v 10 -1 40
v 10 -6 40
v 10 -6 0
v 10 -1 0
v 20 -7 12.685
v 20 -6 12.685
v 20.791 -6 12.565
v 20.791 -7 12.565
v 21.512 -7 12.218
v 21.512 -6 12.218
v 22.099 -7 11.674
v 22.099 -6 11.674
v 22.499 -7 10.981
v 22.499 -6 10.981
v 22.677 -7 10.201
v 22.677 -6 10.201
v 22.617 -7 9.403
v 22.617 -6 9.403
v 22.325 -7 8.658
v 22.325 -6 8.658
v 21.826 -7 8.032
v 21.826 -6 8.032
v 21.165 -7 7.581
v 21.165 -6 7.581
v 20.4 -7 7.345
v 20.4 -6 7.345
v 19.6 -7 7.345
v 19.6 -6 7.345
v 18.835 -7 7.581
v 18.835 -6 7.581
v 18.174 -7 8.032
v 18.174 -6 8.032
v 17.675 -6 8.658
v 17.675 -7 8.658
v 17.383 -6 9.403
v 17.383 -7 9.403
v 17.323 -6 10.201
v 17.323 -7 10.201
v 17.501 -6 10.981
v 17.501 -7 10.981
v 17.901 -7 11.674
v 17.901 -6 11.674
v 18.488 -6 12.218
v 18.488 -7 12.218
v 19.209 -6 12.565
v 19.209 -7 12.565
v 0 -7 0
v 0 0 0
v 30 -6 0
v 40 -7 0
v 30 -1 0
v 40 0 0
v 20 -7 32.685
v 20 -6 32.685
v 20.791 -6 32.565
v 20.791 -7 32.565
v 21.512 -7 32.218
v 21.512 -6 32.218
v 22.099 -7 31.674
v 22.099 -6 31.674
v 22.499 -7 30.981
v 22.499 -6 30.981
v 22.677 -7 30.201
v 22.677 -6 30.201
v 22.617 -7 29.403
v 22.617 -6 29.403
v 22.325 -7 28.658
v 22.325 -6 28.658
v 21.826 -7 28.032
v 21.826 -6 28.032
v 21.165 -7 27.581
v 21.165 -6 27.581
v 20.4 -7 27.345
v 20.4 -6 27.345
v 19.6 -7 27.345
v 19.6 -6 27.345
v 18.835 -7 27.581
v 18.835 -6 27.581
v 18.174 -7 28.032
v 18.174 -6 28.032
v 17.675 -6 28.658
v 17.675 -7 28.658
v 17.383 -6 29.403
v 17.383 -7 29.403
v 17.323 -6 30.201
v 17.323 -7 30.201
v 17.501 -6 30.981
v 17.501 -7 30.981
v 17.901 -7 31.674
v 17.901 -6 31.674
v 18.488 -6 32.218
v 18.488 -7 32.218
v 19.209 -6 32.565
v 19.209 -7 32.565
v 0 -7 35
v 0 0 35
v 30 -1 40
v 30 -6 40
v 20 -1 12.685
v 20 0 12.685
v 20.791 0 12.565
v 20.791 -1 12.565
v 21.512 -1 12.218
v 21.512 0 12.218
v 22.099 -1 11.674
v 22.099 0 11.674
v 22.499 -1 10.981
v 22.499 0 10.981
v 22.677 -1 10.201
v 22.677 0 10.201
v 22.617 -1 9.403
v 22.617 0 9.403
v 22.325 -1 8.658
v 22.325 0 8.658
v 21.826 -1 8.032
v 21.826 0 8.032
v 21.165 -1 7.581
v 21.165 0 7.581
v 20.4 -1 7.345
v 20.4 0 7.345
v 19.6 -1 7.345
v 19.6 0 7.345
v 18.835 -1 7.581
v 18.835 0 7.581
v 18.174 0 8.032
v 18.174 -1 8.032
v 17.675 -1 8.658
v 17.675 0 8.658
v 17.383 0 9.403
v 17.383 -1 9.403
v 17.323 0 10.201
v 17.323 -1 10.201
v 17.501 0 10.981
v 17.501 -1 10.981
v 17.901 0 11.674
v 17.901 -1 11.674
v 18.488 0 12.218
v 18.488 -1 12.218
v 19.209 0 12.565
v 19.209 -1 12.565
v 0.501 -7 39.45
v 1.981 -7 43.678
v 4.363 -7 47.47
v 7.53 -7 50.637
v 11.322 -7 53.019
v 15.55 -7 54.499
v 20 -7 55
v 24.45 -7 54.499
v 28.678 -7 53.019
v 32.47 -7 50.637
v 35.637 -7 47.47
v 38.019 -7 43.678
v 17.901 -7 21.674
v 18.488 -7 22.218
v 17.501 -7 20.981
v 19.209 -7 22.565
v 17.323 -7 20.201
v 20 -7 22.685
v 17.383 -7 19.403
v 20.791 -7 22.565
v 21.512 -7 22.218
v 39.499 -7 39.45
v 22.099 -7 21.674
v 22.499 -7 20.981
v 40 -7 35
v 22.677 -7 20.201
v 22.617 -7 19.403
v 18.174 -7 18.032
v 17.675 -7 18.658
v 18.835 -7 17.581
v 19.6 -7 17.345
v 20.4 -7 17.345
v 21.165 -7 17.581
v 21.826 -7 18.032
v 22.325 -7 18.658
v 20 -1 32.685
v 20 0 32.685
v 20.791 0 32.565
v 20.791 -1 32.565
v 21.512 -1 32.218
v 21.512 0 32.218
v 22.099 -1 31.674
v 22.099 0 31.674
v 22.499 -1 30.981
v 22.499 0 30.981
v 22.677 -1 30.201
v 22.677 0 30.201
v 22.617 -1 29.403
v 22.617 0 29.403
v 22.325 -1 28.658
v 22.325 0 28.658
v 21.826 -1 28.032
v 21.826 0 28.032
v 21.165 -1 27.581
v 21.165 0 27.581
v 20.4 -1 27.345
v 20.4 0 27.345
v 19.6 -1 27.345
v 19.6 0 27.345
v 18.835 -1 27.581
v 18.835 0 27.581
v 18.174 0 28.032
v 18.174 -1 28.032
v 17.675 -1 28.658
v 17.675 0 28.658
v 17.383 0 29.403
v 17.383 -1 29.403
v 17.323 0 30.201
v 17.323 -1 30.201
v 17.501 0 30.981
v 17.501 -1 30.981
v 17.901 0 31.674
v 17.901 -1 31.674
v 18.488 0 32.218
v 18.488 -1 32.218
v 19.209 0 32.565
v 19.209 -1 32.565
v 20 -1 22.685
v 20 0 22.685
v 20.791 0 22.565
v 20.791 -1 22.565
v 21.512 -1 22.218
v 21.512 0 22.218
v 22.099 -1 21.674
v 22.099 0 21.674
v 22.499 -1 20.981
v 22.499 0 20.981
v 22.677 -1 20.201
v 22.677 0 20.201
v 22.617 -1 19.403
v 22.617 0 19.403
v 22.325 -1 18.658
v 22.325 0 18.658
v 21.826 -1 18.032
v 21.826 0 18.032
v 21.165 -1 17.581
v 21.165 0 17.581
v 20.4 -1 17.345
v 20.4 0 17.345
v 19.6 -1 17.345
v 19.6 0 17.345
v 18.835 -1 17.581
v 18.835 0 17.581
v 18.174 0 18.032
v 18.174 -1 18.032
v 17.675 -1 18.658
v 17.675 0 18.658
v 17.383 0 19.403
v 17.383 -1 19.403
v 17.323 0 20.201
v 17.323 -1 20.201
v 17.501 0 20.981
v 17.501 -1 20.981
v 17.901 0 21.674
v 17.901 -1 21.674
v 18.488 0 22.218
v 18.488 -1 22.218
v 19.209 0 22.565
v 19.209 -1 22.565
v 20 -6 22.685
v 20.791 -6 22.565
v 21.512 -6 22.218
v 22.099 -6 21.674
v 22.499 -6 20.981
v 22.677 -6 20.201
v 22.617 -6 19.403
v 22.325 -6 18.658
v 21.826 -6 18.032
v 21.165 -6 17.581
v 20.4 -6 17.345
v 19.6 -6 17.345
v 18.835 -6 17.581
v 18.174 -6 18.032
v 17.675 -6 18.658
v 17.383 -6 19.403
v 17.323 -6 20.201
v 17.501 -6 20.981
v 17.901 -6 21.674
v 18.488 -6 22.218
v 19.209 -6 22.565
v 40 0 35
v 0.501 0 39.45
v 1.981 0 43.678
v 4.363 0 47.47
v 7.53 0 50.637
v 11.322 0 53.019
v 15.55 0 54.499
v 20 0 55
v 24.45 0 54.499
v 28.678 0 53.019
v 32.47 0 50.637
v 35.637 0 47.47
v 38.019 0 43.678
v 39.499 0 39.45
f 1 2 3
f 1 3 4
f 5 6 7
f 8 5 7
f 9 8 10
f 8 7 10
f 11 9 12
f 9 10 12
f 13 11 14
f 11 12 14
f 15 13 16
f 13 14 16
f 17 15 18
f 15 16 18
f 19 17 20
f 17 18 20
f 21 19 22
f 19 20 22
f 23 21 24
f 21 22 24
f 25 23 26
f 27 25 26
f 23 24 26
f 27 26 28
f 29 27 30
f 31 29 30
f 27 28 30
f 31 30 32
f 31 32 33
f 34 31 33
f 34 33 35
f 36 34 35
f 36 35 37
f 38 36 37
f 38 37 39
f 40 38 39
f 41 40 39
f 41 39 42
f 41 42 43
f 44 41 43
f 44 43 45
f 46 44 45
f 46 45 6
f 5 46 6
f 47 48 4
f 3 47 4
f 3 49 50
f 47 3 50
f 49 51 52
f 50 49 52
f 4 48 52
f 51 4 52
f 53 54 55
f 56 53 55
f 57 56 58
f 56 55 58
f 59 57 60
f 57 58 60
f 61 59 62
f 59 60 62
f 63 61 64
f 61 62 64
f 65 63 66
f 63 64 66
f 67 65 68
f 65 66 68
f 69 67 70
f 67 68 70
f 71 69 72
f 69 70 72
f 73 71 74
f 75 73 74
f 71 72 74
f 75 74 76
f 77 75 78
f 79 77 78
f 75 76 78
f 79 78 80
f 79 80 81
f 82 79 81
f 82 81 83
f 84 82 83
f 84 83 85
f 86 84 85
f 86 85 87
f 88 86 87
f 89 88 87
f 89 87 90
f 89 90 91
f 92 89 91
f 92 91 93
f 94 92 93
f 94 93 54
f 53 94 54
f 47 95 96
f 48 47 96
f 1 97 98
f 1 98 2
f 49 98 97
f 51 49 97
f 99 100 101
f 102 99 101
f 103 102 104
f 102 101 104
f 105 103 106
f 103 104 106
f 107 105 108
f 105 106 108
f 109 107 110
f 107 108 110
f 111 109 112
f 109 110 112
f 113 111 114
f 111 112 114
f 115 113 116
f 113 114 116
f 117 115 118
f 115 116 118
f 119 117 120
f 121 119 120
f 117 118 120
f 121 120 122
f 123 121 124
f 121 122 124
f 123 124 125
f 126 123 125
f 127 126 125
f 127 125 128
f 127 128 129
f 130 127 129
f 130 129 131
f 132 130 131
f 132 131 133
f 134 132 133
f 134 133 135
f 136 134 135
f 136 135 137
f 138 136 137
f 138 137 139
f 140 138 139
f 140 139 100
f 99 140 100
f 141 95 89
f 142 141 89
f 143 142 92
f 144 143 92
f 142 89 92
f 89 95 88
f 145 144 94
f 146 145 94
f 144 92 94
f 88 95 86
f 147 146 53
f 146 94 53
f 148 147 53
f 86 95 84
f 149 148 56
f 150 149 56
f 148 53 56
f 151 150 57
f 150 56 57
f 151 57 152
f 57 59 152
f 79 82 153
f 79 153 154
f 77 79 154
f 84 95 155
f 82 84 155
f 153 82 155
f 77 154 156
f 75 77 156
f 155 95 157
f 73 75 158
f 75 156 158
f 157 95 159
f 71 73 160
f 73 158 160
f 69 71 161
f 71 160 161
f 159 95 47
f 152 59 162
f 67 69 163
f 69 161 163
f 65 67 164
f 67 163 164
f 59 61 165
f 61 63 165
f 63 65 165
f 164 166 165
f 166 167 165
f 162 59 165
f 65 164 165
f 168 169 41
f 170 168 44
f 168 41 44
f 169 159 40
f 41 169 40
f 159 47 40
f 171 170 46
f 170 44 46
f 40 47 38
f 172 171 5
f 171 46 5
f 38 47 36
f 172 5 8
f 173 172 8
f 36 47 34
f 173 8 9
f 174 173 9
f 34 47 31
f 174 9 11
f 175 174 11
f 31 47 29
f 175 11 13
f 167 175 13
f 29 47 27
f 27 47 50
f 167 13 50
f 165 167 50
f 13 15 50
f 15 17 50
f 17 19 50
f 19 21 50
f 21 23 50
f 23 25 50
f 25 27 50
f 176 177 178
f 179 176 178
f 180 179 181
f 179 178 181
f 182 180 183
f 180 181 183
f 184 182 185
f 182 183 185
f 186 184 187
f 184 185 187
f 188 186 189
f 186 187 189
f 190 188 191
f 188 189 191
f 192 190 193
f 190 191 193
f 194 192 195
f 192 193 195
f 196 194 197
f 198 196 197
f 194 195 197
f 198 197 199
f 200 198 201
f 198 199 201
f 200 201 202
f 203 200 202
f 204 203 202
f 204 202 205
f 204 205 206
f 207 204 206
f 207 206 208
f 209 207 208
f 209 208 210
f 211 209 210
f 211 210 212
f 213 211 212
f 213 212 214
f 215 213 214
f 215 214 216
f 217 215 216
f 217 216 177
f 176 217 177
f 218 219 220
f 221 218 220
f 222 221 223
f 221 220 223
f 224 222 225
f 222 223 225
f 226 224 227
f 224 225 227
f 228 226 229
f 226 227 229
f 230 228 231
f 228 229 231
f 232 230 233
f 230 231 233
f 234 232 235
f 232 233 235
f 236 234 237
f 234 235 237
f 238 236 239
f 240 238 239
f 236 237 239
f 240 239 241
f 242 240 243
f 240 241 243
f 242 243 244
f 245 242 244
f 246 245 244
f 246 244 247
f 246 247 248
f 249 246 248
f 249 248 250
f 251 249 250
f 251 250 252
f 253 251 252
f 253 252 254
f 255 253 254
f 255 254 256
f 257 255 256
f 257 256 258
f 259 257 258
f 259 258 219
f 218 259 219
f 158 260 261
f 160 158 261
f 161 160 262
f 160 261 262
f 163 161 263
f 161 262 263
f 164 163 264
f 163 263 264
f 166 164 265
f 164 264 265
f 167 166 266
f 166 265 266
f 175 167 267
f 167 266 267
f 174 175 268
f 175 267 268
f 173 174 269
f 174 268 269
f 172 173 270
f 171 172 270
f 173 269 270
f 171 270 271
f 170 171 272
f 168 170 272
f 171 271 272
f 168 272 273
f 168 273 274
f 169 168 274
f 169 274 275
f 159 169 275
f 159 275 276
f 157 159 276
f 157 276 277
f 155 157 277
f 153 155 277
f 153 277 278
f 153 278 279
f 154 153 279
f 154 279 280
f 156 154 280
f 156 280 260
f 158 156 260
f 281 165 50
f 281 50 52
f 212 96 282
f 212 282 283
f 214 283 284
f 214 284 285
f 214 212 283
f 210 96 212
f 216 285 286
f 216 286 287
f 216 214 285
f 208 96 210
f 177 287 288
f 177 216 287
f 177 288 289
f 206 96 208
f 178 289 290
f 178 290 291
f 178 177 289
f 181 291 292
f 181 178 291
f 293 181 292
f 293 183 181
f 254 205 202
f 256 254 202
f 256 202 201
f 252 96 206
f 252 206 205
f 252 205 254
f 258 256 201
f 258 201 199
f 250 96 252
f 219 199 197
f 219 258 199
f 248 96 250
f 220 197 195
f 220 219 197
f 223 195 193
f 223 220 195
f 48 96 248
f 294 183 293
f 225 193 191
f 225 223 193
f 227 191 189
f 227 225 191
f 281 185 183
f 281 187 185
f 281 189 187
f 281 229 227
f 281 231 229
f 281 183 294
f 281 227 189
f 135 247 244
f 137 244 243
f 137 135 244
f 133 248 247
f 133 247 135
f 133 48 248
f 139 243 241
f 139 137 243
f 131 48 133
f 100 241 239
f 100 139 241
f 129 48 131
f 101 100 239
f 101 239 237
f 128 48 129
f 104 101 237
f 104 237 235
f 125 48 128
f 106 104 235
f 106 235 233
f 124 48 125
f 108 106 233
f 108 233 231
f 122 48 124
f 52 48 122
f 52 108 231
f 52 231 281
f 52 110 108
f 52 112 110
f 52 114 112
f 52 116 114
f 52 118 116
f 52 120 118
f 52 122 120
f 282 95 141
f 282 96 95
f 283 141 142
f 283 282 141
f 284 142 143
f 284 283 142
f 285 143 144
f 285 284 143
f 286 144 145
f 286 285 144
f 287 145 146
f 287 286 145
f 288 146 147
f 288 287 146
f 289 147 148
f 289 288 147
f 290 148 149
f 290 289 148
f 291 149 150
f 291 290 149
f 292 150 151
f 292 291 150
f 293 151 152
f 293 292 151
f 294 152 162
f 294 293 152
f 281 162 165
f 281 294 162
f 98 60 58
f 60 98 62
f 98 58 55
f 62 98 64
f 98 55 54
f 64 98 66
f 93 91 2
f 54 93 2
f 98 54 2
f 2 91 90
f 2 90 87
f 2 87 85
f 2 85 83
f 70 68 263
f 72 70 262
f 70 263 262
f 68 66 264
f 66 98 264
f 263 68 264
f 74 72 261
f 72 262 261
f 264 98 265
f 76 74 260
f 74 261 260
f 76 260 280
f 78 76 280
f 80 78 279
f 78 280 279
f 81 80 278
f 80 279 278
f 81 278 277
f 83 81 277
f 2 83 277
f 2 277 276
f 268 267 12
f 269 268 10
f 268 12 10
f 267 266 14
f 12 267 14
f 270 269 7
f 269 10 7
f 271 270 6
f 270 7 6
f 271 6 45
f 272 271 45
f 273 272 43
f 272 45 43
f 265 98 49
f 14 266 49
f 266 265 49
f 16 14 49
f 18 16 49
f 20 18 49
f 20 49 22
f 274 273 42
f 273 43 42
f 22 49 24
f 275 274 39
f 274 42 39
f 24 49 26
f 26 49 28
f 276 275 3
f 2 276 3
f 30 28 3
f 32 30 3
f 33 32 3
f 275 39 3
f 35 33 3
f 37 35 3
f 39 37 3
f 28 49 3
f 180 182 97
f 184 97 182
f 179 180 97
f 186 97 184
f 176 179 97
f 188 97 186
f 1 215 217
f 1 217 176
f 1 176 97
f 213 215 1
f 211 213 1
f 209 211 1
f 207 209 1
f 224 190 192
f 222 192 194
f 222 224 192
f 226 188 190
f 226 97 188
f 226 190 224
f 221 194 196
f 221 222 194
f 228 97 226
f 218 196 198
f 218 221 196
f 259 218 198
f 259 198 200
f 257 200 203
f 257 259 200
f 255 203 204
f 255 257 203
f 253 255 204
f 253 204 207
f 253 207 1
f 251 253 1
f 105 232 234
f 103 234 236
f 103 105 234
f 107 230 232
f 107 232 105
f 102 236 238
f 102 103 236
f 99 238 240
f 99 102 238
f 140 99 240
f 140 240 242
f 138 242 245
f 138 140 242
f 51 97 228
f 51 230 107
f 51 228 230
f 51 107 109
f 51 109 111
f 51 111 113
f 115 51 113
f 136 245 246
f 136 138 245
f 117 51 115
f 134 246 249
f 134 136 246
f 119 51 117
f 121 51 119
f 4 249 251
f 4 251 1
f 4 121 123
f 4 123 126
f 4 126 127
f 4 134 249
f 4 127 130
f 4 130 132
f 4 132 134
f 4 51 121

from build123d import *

# Parameters (mm, degrees)
SKETCH1_W           = 40
SKETCH1_H           = 7
BOSS_EXTRUDE1_DEPTH = 55
SKETCH2_R           = 2.684543284
CUT_EXTRUDE1_DEPTH  = 7
FILLET1_RADIUS      = 20
FILLET1_LENGTH      = 7
SKETCH4_W           = 20
SKETCH4_H           = 5
CUT_EXTRUDE2_DEPTH  = 40


with BuildPart() as part:
    # Sketch1 → Boss-Extrude1 (new body)
    with BuildSketch(Plane.XY):
        with Locations((20, -3.5)):
            Rectangle(SKETCH1_W, SKETCH1_H)
    extrude(amount=BOSS_EXTRUDE1_DEPTH)

    # Sketch2 → Cut-Extrude1 (cut)
    with BuildSketch(Plane(origin=(0, 0, 0), x_dir=(1, 0, 0), z_dir=(0, 1, 0))):
        with Locations(Location((20, -10, 0), (0, 0, 270))):
            Circle(SKETCH2_R)
        with Locations(Location((20, -20, 0), (0, 0, 270))):
            Circle(SKETCH2_R)
        with Locations(Location((20, -30, 0), (0, 0, 270))):
            Circle(SKETCH2_R)
    extrude(amount=-CUT_EXTRUDE1_DEPTH, mode=Mode.SUBTRACT)

    # Fillet1: full round fillet: the end face becomes a half cylinder, R = half its width
    fillet1_face = Plane((20, -3.5, 55), x_dir=(0, 1, 0), z_dir=(0, 0, 1))  # on the end face: x along it, z out of the body
    fillet1_slab = fillet1_face.offset(-FILLET1_RADIUS / 2) * Box(FILLET1_LENGTH, 2 * FILLET1_RADIUS, FILLET1_RADIUS, mode=Mode.PRIVATE)  # the body's end, R deep
    fillet1_round = Plane((20, -3.5, 35), x_dir=(0, 0, 1), z_dir=(0, 1, 0)) * Cylinder(FILLET1_RADIUS, FILLET1_LENGTH, mode=Mode.PRIVATE)  # its axis R under the face
    add(fillet1_slab - fillet1_round, mode=Mode.SUBTRACT)

    # Sketch4 → Cut-Extrude2 (cut)
    with BuildSketch(Plane(origin=(0, 0, 0), x_dir=(-1, 0, 0), z_dir=(0, 0, -1))):
        with Locations((-20, -3.5)):
            Rectangle(SKETCH4_W, SKETCH4_H)
    extrude(amount=-CUT_EXTRUDE2_DEPTH, mode=Mode.SUBTRACT)


solid = part.part
